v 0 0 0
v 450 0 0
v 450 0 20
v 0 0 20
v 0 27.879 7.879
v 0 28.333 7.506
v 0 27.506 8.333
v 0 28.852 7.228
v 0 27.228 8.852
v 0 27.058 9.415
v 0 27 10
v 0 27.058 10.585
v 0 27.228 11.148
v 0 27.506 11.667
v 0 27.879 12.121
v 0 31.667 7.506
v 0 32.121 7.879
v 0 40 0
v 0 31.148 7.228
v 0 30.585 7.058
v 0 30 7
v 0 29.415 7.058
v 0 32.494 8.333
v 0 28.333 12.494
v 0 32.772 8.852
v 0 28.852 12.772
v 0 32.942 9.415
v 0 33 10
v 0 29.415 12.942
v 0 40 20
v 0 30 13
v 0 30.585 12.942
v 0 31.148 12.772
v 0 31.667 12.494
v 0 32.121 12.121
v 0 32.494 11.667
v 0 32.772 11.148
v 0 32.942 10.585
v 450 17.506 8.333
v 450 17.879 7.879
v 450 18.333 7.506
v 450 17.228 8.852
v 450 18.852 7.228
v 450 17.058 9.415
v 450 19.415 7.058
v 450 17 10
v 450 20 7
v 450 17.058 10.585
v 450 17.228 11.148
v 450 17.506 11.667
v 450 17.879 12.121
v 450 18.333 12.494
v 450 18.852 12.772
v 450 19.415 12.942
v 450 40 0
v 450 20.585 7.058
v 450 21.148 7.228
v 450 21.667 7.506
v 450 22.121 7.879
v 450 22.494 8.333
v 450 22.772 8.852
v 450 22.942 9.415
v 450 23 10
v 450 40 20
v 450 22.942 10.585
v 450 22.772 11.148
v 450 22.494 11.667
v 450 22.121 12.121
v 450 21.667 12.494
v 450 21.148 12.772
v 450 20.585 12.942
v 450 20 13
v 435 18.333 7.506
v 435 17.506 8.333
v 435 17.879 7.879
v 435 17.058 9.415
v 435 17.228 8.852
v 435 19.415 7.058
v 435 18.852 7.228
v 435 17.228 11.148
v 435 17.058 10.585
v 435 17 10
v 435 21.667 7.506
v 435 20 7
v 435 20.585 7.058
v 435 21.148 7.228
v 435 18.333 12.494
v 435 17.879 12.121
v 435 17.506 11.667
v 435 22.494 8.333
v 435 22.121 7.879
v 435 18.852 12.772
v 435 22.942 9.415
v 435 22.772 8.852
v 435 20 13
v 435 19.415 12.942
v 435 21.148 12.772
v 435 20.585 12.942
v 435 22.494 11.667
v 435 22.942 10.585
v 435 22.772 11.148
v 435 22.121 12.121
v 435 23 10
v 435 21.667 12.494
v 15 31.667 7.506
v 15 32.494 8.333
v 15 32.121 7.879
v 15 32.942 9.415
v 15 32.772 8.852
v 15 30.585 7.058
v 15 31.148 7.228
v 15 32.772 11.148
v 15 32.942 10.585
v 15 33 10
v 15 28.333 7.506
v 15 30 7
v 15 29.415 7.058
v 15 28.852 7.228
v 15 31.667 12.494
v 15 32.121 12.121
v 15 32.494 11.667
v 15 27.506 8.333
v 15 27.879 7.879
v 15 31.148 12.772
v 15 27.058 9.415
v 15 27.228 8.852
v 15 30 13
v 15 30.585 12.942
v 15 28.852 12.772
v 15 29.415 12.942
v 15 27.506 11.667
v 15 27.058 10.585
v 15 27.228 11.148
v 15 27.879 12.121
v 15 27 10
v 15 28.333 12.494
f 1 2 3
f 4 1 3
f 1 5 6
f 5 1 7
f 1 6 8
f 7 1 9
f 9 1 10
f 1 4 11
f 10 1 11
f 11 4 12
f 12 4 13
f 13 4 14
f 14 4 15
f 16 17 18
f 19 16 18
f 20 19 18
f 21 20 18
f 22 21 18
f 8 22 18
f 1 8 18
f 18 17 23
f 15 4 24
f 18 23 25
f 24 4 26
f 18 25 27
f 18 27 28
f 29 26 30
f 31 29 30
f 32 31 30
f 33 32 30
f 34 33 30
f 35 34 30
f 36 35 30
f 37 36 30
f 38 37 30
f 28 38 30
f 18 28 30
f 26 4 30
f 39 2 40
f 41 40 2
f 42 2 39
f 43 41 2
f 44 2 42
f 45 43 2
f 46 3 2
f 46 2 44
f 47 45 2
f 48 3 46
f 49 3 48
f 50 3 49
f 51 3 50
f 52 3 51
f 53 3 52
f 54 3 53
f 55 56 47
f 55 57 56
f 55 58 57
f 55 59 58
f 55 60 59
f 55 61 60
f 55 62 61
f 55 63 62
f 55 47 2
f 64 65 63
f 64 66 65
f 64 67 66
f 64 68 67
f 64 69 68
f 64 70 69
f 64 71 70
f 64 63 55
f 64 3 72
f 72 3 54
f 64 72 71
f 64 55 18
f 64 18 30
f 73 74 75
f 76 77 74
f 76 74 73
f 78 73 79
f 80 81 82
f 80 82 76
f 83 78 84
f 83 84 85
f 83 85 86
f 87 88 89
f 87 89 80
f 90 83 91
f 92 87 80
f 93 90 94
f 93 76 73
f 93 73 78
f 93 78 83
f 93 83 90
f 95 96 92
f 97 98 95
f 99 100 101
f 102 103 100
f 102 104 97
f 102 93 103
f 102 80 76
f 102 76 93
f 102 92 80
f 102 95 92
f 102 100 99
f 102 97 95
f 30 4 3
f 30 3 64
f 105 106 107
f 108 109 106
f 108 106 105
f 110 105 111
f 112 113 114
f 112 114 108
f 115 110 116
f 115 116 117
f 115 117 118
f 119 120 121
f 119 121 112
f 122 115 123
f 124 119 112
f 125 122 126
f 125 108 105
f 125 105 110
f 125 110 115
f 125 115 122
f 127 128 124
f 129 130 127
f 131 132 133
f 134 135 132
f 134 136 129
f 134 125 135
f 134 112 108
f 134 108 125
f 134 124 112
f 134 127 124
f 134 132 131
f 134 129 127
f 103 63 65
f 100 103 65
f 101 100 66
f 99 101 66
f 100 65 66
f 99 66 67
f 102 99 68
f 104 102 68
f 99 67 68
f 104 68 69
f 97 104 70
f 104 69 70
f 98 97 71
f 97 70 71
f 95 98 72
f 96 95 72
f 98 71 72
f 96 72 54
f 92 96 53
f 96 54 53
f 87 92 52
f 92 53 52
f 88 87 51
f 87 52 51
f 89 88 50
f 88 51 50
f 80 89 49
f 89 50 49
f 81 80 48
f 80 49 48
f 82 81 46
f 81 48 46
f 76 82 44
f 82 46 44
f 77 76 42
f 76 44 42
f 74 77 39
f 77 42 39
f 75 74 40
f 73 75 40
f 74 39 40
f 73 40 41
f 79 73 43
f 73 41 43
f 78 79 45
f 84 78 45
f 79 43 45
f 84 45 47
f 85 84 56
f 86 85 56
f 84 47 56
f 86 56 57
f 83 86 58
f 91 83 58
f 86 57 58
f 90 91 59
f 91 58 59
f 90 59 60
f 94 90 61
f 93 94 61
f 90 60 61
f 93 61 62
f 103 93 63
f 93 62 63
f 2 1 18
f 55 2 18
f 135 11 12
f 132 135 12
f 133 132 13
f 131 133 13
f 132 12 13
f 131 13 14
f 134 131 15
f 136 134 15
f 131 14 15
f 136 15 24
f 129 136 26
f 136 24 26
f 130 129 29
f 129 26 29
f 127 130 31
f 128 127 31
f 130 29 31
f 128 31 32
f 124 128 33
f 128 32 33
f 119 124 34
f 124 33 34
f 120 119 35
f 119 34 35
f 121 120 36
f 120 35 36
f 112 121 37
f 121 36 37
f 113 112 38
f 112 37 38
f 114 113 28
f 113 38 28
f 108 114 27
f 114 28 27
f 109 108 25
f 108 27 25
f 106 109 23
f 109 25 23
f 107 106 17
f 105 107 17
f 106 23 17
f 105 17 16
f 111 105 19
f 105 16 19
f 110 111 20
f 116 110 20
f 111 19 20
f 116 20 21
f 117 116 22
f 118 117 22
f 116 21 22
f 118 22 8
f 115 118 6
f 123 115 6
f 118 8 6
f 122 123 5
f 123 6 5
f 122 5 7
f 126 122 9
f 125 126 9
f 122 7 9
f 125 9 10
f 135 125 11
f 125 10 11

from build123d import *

# Parameters (mm, degrees)
F0_W     = 40
F0_H     = 20
F1_DEPTH = 450
F2_R     = 3
F3_DEPTH = 15
F4_R     = 3
F5_DEPTH = 15


with BuildPart() as f1:
    # F0 (on Right) → F1 (new body)
    with BuildSketch(Plane.YZ):
        with Locations((20, 10)):
            Rectangle(F0_W, F0_H)
    extrude(amount=F1_DEPTH)

    # F2 (on face) → F3 (cut)
    with BuildSketch(Plane.YZ.offset(450)):
        with Locations((20, 10)):
            Circle(F2_R)
    extrude(amount=-F3_DEPTH, mode=Mode.SUBTRACT)

    # F4 (on face) → F5 (cut)
    with BuildSketch(Plane(origin=(0, 0, 0), x_dir=(0, -1, 0), z_dir=(-1, 0, 0))):
        with Locations((-30, 10)):
            Circle(F4_R)
    extrude(amount=-F5_DEPTH, mode=Mode.SUBTRACT)


solid = f1.part
